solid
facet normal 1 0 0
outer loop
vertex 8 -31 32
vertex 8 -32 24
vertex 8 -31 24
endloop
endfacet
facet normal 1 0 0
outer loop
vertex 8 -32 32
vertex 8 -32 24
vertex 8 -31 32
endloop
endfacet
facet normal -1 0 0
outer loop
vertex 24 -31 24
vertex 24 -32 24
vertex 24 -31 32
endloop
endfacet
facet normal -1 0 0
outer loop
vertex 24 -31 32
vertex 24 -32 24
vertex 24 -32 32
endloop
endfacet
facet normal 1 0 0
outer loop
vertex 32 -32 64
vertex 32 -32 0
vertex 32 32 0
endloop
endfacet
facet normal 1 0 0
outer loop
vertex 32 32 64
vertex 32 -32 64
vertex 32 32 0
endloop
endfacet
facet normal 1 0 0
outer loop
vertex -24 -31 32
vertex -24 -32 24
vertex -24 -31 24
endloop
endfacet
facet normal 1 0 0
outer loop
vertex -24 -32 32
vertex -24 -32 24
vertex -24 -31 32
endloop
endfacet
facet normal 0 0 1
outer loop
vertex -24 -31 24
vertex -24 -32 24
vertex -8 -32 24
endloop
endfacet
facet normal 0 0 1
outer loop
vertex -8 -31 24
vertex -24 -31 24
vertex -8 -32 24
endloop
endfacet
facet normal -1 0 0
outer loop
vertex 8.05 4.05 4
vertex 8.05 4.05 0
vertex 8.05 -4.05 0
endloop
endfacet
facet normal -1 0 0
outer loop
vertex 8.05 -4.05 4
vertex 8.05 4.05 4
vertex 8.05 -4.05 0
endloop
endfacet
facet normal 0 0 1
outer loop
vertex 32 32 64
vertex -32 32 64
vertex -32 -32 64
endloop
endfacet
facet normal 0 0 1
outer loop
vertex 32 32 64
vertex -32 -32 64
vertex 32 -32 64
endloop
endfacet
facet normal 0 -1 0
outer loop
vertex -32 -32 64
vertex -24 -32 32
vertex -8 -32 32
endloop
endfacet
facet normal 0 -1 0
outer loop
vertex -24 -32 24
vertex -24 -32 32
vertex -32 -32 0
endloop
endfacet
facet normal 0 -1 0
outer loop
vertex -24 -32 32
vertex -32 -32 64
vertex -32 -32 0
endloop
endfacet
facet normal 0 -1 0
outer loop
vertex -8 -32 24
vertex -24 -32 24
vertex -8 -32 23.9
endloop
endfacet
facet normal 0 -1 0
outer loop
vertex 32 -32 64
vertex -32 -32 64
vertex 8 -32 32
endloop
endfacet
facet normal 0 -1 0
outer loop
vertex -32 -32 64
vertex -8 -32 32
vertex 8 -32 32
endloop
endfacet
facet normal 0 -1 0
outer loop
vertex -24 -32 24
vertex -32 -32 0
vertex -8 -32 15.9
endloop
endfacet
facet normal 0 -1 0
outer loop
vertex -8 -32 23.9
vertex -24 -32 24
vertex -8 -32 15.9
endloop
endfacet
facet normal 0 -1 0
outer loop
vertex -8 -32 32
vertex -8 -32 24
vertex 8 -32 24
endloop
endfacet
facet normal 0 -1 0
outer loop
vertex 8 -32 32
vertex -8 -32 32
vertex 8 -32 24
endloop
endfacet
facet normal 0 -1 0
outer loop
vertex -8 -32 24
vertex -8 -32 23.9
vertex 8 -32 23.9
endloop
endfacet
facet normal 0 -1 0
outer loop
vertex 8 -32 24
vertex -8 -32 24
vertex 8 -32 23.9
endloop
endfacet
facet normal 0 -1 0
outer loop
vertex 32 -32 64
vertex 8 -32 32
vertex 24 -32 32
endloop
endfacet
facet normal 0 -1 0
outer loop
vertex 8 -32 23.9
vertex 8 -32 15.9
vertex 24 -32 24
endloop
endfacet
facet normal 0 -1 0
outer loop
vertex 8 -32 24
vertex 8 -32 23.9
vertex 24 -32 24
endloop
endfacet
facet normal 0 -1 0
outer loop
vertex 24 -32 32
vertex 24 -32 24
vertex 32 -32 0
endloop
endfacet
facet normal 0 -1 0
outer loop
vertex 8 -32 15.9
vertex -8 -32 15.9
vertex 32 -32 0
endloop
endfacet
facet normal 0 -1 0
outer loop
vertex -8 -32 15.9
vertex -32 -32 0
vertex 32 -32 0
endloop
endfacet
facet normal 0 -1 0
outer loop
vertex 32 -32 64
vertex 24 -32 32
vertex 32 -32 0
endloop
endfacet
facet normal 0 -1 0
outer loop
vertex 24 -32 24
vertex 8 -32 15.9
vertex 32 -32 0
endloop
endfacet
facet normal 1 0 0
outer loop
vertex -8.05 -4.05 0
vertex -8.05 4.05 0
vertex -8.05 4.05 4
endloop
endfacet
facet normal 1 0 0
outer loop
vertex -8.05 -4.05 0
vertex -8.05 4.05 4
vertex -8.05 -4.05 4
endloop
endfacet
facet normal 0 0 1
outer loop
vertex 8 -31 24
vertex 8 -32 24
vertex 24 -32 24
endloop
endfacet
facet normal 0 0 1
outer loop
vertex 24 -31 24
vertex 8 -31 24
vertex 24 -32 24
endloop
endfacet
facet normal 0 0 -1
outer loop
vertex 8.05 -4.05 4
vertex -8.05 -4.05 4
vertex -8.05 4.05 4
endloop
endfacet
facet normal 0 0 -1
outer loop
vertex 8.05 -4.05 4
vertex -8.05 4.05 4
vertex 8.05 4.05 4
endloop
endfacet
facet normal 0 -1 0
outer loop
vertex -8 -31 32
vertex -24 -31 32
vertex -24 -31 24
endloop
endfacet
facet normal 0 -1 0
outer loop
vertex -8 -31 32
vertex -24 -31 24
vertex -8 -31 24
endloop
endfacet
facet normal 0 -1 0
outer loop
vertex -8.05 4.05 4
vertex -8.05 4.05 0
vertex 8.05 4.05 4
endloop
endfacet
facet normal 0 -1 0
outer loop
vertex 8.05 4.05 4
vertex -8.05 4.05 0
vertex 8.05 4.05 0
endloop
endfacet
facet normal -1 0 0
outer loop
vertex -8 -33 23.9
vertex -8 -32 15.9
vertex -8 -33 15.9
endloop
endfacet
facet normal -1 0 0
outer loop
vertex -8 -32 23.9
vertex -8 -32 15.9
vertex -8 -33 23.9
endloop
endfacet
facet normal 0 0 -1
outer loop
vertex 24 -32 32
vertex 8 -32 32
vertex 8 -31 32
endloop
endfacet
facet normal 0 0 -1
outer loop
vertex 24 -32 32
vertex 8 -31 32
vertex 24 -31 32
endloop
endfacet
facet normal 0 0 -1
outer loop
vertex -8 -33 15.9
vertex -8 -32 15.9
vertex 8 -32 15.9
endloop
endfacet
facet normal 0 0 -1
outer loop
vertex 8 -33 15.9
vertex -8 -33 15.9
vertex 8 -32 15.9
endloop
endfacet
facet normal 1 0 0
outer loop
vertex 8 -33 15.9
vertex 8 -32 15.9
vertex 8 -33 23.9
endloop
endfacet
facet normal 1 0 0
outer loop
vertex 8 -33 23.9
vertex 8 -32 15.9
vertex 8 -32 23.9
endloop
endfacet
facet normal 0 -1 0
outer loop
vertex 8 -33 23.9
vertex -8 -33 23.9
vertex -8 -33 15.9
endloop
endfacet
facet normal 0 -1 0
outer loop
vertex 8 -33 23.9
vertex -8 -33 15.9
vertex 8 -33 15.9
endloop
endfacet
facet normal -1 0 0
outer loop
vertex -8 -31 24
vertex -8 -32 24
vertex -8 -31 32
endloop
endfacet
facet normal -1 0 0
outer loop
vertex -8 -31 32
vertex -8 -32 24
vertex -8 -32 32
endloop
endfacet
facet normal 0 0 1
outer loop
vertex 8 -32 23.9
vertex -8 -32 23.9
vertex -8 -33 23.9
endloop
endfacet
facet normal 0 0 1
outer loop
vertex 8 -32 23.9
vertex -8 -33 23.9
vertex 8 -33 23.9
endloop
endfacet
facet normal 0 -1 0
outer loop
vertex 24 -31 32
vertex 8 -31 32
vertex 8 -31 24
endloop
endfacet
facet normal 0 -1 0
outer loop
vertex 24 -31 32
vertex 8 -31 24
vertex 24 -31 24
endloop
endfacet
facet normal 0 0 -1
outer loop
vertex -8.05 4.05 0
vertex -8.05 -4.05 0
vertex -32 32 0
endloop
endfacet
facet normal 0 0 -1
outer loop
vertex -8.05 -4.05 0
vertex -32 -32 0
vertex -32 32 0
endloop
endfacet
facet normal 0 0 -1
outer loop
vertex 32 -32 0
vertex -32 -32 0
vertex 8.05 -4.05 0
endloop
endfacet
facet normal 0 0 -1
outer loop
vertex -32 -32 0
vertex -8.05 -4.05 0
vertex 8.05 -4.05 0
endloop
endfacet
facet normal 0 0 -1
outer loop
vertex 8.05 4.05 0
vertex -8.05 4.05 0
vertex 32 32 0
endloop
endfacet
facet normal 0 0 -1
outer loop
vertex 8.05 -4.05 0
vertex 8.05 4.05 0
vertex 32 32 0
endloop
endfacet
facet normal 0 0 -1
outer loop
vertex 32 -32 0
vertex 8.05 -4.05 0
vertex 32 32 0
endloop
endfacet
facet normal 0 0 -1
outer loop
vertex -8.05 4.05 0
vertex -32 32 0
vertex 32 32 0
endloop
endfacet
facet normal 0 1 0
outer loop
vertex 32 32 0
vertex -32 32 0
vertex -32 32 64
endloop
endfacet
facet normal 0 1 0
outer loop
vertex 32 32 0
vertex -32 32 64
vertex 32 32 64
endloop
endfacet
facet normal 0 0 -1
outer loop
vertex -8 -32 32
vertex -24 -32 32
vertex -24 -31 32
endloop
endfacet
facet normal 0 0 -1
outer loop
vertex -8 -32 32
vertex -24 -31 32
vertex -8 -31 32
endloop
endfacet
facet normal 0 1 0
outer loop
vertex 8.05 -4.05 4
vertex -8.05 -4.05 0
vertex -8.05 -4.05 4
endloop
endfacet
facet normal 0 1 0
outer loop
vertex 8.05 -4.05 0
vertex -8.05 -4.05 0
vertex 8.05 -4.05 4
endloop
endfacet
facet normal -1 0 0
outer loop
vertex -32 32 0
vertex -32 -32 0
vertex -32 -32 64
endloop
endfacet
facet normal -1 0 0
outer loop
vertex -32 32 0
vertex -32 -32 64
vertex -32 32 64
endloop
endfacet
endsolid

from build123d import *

# Parameters (mm, degrees)
F0_W     = 64
F0_H     = 64
F1_DEPTH = 64
F2_W     = 16
F2_H     = 8
F3_DEPTH = 1
F4_DEPTH = 1
F5_W     = 16.1
F5_H     = 8.1
F6_DEPTH = 4


with BuildPart() as f1:
    # F0 (on Top) → F1 (new body)
    with BuildSketch(Plane.XY):
        Rectangle(F0_W, F0_H)
    extrude(amount=F1_DEPTH)

    # F2 (on face) → F3 (join)
    with BuildSketch(Plane.XZ.offset(32)):
        with Locations((0, 19.9)):
            Rectangle(F2_W, F2_H)
    extrude(amount=F3_DEPTH)

    # F2 (on face) → F4 (cut)
    with BuildSketch(Plane.XZ.offset(32)):
        with Locations((-16, 28)):
            Rectangle(F2_W, F2_H)
        with Locations((16, 28)):
            Rectangle(F2_W, F2_H)
    extrude(amount=-F4_DEPTH, mode=Mode.SUBTRACT)

    # F5 (on face) → F6 (cut)
    with BuildSketch(Plane(origin=(0, 0, 0), x_dir=(1, 0, 0), z_dir=(0, 0, -1))):
        Rectangle(F5_W, F5_H)
    extrude(amount=-F6_DEPTH, mode=Mode.SUBTRACT)


solid = f1.part
